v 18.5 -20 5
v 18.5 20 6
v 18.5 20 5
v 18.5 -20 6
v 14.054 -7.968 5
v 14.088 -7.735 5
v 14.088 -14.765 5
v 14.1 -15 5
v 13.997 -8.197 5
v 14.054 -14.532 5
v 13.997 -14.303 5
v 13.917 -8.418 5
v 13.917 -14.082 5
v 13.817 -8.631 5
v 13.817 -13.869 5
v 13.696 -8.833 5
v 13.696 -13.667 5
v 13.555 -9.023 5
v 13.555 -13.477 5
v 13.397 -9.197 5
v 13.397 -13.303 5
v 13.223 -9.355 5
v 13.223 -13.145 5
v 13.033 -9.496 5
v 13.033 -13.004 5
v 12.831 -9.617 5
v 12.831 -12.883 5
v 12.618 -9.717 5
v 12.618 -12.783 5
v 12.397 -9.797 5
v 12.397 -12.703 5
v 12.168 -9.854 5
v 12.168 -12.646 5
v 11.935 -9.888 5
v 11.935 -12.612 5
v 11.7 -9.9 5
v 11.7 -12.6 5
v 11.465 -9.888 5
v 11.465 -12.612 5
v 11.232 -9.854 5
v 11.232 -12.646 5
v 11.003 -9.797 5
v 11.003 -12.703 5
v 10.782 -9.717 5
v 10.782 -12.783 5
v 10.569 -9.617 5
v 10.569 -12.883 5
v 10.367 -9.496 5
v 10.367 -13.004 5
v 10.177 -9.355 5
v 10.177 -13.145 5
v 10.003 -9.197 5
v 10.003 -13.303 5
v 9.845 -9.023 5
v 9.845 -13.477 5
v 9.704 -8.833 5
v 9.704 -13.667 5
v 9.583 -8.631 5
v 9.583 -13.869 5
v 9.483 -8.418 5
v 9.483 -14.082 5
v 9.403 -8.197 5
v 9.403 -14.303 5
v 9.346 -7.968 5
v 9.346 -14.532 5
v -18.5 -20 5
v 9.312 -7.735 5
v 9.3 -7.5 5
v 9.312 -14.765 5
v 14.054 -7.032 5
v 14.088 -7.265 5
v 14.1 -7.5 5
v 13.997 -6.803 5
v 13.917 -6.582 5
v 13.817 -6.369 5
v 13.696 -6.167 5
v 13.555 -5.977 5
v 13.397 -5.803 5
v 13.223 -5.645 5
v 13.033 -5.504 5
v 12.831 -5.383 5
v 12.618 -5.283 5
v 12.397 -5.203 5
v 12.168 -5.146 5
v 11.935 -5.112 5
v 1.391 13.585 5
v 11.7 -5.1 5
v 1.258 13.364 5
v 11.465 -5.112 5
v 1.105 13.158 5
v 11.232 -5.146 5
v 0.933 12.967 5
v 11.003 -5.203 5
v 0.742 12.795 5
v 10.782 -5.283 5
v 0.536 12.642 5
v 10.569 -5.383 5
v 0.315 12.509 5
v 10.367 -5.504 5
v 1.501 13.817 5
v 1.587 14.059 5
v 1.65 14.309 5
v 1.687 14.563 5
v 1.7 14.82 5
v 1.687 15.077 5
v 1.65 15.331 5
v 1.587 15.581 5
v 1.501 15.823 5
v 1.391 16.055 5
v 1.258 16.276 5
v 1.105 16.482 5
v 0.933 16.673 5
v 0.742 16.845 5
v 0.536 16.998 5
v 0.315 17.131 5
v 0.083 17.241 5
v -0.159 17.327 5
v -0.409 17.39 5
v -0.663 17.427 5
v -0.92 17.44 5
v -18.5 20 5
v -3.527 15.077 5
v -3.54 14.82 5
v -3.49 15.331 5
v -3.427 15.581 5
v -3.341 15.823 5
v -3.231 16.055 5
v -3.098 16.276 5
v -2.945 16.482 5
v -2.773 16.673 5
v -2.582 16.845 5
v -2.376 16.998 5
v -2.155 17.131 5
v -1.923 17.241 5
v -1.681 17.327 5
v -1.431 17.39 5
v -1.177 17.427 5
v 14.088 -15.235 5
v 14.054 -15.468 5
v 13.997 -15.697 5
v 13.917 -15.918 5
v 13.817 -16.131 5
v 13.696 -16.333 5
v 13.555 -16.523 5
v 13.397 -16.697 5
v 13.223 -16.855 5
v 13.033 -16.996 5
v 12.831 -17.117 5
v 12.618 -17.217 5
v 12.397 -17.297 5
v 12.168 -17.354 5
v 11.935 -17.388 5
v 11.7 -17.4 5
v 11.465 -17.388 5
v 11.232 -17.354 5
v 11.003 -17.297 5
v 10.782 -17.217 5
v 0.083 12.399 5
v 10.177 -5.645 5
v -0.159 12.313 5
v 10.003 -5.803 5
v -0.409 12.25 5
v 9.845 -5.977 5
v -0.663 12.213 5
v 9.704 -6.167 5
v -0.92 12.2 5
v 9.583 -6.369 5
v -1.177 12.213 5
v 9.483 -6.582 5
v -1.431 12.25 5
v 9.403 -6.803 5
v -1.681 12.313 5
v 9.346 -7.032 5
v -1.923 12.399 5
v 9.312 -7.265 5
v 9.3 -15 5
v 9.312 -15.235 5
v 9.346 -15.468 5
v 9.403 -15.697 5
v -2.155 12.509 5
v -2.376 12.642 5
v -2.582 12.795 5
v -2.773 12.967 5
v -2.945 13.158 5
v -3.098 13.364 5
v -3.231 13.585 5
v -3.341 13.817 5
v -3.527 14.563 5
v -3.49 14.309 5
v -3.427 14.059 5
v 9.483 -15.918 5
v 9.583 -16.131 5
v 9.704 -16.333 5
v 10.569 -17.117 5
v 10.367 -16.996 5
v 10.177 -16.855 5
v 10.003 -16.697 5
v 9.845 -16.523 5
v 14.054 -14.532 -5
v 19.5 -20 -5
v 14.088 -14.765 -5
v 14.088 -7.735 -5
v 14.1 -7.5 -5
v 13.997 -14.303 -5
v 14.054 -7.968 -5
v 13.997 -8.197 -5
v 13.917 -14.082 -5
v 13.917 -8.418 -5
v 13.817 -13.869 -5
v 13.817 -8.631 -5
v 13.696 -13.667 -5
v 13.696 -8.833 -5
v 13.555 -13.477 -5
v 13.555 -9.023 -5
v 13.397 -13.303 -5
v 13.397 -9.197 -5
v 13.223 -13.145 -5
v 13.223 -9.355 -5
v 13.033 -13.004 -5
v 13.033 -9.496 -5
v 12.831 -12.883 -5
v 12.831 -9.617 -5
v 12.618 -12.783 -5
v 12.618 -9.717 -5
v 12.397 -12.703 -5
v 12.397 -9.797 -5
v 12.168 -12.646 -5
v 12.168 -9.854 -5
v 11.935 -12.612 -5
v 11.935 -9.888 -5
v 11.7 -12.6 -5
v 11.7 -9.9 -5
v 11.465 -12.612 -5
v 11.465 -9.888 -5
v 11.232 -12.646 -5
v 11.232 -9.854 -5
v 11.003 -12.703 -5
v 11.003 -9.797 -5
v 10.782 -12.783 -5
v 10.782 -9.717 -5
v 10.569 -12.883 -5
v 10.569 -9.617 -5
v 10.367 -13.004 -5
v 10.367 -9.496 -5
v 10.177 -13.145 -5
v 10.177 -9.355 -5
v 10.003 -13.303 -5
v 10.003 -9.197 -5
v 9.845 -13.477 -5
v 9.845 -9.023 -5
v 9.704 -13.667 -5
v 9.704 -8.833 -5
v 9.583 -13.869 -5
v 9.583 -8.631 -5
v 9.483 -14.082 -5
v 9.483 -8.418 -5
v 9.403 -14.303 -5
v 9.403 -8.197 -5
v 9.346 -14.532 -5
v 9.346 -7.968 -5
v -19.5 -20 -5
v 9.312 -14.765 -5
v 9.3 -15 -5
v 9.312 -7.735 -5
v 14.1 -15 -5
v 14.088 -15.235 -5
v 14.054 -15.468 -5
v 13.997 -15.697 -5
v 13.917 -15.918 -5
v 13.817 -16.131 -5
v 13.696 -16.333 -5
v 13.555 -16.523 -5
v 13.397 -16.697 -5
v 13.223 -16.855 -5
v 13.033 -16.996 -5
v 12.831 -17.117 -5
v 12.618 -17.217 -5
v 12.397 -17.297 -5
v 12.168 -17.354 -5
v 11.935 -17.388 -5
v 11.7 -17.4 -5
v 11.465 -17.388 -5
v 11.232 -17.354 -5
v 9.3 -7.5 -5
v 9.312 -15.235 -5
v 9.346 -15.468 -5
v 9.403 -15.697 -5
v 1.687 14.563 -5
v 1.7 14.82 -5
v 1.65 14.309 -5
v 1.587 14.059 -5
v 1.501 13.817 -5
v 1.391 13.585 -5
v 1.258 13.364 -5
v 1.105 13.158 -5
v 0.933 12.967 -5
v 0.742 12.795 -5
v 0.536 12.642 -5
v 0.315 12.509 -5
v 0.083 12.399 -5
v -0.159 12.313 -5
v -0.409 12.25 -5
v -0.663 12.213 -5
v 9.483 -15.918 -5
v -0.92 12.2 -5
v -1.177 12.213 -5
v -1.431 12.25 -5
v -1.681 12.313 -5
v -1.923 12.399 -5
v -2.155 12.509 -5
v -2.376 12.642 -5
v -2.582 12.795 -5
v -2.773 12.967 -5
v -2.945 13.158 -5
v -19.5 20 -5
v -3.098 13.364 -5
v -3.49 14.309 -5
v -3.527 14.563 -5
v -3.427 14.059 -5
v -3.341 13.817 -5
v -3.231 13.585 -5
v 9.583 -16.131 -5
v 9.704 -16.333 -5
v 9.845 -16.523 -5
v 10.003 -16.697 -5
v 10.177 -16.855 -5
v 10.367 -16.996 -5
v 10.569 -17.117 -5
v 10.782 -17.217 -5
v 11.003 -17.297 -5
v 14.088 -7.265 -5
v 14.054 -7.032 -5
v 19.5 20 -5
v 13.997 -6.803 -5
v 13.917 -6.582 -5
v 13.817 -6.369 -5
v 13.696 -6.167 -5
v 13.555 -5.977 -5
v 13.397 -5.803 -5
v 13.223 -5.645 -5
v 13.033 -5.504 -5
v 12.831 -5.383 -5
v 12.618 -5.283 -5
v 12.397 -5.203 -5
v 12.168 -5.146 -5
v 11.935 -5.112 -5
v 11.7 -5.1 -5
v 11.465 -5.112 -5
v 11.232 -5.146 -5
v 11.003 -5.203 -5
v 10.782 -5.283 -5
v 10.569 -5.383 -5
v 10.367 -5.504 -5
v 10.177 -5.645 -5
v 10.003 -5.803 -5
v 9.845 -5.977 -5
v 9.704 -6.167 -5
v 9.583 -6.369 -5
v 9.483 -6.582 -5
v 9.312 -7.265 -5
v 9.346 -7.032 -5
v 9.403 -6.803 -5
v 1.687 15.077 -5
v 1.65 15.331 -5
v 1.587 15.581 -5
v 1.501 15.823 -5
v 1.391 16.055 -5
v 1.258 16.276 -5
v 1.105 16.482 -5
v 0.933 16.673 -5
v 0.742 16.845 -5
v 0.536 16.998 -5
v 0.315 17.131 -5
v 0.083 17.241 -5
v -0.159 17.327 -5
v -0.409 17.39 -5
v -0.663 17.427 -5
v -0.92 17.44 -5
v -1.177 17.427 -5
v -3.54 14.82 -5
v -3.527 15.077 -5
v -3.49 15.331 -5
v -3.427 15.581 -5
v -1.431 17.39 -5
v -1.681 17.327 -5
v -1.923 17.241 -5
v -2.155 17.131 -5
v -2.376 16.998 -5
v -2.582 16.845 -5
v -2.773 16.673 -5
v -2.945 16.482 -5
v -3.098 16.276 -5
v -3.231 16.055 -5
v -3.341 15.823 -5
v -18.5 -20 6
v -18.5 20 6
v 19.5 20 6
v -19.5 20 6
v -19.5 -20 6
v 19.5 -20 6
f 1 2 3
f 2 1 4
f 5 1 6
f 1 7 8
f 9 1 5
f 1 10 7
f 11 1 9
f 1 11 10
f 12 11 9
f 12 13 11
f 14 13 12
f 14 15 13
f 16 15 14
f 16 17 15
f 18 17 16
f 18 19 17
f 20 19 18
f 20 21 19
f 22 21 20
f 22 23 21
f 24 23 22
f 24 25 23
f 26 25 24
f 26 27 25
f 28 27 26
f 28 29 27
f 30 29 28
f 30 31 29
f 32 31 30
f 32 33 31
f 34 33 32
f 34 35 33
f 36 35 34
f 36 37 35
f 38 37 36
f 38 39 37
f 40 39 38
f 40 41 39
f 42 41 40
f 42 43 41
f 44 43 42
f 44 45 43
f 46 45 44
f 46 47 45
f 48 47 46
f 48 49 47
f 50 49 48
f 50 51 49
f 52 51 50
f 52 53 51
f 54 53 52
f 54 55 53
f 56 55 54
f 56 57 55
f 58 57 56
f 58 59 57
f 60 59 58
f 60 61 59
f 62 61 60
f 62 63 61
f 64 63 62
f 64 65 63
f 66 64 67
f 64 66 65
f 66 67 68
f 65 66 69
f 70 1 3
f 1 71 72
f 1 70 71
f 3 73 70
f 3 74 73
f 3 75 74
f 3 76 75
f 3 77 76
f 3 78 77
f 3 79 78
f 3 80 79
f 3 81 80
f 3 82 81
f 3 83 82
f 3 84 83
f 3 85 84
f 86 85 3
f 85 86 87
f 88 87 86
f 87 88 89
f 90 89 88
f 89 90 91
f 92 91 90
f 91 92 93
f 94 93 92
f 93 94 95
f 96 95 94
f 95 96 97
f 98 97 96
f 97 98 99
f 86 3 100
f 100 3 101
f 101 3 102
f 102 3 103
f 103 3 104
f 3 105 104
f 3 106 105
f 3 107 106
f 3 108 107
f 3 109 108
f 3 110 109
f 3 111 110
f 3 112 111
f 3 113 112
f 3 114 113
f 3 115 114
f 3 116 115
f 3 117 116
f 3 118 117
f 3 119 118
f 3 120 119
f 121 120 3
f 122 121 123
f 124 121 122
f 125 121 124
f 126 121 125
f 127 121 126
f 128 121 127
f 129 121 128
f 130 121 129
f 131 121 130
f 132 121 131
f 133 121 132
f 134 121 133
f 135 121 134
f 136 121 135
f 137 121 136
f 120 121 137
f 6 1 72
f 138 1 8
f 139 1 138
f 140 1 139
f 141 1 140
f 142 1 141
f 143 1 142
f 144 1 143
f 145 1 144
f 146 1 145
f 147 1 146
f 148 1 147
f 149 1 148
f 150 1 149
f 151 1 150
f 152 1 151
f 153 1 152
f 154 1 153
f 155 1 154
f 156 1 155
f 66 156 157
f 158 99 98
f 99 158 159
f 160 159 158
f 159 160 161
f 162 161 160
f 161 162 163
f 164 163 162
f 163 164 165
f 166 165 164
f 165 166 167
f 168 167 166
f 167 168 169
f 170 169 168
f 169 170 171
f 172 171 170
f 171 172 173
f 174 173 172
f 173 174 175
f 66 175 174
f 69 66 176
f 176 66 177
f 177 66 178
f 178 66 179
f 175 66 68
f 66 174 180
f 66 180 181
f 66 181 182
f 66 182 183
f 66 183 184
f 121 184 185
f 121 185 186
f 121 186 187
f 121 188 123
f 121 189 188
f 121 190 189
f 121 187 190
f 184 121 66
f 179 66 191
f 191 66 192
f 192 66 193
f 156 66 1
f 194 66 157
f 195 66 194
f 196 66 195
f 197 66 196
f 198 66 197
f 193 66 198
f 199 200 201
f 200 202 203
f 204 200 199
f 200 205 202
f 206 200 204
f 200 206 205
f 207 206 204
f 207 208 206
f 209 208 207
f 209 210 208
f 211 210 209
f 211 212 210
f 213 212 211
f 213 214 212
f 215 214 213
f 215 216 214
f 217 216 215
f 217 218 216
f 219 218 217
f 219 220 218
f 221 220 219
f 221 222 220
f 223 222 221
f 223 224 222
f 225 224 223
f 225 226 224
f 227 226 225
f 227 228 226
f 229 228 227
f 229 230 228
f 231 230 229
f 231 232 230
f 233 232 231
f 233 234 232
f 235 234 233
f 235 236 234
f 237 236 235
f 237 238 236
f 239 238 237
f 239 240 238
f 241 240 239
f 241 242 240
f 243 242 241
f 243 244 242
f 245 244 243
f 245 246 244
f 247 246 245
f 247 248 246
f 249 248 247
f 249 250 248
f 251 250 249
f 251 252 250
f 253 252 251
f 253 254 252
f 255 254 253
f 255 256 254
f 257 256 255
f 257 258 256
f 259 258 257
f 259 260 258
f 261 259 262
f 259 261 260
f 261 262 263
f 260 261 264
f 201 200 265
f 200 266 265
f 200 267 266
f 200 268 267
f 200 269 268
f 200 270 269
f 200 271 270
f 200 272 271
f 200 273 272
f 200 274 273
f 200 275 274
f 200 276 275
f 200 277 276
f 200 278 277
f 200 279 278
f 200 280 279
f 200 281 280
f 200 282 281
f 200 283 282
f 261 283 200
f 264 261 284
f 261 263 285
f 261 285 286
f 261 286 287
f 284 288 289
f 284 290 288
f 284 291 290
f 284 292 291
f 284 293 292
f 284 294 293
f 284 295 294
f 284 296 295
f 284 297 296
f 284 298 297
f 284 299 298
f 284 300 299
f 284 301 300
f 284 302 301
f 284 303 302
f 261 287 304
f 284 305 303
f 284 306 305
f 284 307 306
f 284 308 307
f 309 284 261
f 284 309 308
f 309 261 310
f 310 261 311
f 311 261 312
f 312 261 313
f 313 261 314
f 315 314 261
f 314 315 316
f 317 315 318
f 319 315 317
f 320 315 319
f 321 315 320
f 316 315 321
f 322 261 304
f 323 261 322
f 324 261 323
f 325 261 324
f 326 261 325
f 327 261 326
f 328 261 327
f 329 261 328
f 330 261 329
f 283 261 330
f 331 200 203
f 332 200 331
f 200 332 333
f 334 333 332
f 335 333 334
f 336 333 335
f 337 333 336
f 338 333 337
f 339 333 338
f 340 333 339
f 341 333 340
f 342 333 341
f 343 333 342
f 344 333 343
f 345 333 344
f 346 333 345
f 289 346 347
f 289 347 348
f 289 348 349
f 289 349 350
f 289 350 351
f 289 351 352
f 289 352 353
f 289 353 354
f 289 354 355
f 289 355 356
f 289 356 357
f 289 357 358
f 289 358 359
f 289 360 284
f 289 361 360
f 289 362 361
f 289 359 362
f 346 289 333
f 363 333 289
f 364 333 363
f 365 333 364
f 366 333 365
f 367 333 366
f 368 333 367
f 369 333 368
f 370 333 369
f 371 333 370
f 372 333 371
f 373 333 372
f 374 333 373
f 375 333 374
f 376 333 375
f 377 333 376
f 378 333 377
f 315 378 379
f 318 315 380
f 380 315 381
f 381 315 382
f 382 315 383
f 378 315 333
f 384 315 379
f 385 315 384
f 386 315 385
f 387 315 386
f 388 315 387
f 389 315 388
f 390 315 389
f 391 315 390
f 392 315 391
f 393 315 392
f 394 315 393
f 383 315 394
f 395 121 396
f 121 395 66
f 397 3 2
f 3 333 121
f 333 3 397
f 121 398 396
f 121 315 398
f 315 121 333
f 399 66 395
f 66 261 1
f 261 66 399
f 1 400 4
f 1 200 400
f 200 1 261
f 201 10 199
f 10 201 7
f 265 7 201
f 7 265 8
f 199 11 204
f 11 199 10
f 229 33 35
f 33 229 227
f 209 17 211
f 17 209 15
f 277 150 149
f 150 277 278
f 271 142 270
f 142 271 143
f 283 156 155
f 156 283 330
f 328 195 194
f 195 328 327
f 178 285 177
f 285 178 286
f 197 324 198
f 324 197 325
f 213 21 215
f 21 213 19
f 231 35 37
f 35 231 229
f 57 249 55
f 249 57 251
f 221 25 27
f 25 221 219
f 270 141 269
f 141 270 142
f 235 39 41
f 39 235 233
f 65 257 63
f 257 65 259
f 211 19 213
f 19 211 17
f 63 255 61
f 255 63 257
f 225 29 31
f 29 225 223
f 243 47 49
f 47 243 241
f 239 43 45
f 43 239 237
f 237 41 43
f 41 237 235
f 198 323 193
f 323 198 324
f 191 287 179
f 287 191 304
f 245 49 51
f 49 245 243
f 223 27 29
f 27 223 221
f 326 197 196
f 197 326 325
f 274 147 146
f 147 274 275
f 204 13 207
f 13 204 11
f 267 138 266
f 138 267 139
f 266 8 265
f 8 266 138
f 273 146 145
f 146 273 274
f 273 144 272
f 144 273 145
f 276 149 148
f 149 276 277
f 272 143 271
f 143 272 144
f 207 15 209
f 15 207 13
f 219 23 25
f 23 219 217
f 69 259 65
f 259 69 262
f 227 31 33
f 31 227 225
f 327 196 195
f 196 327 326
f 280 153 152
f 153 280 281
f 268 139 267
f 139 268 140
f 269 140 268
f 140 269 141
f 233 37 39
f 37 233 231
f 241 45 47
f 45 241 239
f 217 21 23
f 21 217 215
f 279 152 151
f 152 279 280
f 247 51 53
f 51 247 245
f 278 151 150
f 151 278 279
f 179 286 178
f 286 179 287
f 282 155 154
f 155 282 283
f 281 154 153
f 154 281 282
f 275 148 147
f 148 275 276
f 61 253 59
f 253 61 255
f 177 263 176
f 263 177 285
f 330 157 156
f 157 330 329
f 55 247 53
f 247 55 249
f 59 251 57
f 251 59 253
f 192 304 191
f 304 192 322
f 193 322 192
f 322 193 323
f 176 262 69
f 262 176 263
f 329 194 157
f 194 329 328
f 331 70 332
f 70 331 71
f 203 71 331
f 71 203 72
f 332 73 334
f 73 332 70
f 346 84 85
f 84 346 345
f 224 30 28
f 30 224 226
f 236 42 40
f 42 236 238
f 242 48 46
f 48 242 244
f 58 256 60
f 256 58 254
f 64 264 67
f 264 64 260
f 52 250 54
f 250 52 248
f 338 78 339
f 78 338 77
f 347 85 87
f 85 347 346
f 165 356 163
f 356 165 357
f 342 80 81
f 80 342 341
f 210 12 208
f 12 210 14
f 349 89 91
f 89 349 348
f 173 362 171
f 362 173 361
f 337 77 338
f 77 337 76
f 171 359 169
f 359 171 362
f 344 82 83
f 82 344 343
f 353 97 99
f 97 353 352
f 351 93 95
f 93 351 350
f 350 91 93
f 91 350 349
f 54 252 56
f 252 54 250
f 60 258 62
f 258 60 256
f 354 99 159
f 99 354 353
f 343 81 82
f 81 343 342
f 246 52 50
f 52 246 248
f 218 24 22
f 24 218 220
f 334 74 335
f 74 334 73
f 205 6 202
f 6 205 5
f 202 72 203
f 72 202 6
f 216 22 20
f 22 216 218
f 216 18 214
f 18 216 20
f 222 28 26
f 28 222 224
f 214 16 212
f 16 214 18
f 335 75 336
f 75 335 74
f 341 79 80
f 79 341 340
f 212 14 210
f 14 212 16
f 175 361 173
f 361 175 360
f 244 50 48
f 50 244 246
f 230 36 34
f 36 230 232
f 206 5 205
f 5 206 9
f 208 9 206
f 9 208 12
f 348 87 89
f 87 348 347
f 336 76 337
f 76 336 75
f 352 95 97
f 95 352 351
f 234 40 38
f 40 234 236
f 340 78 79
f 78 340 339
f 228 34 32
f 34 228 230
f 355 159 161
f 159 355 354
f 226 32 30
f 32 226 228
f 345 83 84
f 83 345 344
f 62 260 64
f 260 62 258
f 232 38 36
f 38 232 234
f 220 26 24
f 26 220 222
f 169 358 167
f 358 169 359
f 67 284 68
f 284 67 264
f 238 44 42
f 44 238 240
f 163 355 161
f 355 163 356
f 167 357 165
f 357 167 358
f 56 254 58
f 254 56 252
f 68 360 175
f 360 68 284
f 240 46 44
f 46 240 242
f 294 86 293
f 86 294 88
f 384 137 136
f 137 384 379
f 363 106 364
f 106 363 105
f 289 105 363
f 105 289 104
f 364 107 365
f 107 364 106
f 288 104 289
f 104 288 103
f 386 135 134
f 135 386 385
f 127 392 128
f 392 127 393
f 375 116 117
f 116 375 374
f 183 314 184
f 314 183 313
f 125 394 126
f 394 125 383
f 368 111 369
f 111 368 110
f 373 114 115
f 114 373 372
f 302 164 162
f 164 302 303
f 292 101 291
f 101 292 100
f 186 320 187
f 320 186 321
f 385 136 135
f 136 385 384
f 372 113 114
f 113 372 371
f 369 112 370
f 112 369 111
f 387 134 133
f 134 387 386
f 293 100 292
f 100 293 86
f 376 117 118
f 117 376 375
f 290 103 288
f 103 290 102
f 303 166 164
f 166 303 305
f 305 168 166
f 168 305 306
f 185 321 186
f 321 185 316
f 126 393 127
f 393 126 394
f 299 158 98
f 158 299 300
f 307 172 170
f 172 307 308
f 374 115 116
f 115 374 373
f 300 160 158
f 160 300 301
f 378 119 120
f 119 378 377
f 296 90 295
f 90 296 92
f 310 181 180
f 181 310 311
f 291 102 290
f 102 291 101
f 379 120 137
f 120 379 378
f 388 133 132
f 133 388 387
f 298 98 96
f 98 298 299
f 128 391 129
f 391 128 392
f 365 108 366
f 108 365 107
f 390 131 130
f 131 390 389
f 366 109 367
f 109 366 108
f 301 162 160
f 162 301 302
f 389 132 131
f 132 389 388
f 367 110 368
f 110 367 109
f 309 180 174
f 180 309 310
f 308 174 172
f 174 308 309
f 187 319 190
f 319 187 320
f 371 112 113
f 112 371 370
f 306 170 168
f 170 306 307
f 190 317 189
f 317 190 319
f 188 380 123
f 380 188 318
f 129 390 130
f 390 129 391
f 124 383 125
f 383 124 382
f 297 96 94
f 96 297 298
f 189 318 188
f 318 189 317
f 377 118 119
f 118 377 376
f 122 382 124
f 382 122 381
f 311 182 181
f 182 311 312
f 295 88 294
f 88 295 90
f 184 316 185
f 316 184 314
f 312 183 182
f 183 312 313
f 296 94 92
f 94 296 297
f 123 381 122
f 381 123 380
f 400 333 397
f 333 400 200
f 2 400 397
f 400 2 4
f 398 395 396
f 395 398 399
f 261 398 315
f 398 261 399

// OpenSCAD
railX=37.0;
railY=40;
railZ=10;
holeD=4.8;
holeX=railX/2-6.8;
hole1Y=-railY/2+5;
hole2Y=-railY/2+12.5;
frameThickness=1;

guardholeD=5.24;
guardholeX=railX/2-(16.8+guardholeD/2);
guardholeY=-railY/2+(32.2+guardholeD/2);

module FReverbuilt()
{
difference() {
    cube([railX,railY,railZ],center=true);
    translate([holeX,hole1Y,0])cylinder(d=holeD,h=railZ+0.01,$fn=64,center=true);
    translate([holeX,hole2Y,0])cylinder(d=holeD,h=railZ+0.01,$fn=64,center=true);
    translate([guardholeX,guardholeY,0])cylinder(d=guardholeD,h=railZ+0.01,$fn=64,center=true);
}

//Frame
translate([railX/2+frameThickness/2,0,frameThickness/2])cube([frameThickness,railY,railZ+frameThickness],center=true);
translate([-railX/2-frameThickness/2,0,frameThickness/2])cube([frameThickness,railY,railZ+frameThickness],center=true);

}

FReverbuilt();
